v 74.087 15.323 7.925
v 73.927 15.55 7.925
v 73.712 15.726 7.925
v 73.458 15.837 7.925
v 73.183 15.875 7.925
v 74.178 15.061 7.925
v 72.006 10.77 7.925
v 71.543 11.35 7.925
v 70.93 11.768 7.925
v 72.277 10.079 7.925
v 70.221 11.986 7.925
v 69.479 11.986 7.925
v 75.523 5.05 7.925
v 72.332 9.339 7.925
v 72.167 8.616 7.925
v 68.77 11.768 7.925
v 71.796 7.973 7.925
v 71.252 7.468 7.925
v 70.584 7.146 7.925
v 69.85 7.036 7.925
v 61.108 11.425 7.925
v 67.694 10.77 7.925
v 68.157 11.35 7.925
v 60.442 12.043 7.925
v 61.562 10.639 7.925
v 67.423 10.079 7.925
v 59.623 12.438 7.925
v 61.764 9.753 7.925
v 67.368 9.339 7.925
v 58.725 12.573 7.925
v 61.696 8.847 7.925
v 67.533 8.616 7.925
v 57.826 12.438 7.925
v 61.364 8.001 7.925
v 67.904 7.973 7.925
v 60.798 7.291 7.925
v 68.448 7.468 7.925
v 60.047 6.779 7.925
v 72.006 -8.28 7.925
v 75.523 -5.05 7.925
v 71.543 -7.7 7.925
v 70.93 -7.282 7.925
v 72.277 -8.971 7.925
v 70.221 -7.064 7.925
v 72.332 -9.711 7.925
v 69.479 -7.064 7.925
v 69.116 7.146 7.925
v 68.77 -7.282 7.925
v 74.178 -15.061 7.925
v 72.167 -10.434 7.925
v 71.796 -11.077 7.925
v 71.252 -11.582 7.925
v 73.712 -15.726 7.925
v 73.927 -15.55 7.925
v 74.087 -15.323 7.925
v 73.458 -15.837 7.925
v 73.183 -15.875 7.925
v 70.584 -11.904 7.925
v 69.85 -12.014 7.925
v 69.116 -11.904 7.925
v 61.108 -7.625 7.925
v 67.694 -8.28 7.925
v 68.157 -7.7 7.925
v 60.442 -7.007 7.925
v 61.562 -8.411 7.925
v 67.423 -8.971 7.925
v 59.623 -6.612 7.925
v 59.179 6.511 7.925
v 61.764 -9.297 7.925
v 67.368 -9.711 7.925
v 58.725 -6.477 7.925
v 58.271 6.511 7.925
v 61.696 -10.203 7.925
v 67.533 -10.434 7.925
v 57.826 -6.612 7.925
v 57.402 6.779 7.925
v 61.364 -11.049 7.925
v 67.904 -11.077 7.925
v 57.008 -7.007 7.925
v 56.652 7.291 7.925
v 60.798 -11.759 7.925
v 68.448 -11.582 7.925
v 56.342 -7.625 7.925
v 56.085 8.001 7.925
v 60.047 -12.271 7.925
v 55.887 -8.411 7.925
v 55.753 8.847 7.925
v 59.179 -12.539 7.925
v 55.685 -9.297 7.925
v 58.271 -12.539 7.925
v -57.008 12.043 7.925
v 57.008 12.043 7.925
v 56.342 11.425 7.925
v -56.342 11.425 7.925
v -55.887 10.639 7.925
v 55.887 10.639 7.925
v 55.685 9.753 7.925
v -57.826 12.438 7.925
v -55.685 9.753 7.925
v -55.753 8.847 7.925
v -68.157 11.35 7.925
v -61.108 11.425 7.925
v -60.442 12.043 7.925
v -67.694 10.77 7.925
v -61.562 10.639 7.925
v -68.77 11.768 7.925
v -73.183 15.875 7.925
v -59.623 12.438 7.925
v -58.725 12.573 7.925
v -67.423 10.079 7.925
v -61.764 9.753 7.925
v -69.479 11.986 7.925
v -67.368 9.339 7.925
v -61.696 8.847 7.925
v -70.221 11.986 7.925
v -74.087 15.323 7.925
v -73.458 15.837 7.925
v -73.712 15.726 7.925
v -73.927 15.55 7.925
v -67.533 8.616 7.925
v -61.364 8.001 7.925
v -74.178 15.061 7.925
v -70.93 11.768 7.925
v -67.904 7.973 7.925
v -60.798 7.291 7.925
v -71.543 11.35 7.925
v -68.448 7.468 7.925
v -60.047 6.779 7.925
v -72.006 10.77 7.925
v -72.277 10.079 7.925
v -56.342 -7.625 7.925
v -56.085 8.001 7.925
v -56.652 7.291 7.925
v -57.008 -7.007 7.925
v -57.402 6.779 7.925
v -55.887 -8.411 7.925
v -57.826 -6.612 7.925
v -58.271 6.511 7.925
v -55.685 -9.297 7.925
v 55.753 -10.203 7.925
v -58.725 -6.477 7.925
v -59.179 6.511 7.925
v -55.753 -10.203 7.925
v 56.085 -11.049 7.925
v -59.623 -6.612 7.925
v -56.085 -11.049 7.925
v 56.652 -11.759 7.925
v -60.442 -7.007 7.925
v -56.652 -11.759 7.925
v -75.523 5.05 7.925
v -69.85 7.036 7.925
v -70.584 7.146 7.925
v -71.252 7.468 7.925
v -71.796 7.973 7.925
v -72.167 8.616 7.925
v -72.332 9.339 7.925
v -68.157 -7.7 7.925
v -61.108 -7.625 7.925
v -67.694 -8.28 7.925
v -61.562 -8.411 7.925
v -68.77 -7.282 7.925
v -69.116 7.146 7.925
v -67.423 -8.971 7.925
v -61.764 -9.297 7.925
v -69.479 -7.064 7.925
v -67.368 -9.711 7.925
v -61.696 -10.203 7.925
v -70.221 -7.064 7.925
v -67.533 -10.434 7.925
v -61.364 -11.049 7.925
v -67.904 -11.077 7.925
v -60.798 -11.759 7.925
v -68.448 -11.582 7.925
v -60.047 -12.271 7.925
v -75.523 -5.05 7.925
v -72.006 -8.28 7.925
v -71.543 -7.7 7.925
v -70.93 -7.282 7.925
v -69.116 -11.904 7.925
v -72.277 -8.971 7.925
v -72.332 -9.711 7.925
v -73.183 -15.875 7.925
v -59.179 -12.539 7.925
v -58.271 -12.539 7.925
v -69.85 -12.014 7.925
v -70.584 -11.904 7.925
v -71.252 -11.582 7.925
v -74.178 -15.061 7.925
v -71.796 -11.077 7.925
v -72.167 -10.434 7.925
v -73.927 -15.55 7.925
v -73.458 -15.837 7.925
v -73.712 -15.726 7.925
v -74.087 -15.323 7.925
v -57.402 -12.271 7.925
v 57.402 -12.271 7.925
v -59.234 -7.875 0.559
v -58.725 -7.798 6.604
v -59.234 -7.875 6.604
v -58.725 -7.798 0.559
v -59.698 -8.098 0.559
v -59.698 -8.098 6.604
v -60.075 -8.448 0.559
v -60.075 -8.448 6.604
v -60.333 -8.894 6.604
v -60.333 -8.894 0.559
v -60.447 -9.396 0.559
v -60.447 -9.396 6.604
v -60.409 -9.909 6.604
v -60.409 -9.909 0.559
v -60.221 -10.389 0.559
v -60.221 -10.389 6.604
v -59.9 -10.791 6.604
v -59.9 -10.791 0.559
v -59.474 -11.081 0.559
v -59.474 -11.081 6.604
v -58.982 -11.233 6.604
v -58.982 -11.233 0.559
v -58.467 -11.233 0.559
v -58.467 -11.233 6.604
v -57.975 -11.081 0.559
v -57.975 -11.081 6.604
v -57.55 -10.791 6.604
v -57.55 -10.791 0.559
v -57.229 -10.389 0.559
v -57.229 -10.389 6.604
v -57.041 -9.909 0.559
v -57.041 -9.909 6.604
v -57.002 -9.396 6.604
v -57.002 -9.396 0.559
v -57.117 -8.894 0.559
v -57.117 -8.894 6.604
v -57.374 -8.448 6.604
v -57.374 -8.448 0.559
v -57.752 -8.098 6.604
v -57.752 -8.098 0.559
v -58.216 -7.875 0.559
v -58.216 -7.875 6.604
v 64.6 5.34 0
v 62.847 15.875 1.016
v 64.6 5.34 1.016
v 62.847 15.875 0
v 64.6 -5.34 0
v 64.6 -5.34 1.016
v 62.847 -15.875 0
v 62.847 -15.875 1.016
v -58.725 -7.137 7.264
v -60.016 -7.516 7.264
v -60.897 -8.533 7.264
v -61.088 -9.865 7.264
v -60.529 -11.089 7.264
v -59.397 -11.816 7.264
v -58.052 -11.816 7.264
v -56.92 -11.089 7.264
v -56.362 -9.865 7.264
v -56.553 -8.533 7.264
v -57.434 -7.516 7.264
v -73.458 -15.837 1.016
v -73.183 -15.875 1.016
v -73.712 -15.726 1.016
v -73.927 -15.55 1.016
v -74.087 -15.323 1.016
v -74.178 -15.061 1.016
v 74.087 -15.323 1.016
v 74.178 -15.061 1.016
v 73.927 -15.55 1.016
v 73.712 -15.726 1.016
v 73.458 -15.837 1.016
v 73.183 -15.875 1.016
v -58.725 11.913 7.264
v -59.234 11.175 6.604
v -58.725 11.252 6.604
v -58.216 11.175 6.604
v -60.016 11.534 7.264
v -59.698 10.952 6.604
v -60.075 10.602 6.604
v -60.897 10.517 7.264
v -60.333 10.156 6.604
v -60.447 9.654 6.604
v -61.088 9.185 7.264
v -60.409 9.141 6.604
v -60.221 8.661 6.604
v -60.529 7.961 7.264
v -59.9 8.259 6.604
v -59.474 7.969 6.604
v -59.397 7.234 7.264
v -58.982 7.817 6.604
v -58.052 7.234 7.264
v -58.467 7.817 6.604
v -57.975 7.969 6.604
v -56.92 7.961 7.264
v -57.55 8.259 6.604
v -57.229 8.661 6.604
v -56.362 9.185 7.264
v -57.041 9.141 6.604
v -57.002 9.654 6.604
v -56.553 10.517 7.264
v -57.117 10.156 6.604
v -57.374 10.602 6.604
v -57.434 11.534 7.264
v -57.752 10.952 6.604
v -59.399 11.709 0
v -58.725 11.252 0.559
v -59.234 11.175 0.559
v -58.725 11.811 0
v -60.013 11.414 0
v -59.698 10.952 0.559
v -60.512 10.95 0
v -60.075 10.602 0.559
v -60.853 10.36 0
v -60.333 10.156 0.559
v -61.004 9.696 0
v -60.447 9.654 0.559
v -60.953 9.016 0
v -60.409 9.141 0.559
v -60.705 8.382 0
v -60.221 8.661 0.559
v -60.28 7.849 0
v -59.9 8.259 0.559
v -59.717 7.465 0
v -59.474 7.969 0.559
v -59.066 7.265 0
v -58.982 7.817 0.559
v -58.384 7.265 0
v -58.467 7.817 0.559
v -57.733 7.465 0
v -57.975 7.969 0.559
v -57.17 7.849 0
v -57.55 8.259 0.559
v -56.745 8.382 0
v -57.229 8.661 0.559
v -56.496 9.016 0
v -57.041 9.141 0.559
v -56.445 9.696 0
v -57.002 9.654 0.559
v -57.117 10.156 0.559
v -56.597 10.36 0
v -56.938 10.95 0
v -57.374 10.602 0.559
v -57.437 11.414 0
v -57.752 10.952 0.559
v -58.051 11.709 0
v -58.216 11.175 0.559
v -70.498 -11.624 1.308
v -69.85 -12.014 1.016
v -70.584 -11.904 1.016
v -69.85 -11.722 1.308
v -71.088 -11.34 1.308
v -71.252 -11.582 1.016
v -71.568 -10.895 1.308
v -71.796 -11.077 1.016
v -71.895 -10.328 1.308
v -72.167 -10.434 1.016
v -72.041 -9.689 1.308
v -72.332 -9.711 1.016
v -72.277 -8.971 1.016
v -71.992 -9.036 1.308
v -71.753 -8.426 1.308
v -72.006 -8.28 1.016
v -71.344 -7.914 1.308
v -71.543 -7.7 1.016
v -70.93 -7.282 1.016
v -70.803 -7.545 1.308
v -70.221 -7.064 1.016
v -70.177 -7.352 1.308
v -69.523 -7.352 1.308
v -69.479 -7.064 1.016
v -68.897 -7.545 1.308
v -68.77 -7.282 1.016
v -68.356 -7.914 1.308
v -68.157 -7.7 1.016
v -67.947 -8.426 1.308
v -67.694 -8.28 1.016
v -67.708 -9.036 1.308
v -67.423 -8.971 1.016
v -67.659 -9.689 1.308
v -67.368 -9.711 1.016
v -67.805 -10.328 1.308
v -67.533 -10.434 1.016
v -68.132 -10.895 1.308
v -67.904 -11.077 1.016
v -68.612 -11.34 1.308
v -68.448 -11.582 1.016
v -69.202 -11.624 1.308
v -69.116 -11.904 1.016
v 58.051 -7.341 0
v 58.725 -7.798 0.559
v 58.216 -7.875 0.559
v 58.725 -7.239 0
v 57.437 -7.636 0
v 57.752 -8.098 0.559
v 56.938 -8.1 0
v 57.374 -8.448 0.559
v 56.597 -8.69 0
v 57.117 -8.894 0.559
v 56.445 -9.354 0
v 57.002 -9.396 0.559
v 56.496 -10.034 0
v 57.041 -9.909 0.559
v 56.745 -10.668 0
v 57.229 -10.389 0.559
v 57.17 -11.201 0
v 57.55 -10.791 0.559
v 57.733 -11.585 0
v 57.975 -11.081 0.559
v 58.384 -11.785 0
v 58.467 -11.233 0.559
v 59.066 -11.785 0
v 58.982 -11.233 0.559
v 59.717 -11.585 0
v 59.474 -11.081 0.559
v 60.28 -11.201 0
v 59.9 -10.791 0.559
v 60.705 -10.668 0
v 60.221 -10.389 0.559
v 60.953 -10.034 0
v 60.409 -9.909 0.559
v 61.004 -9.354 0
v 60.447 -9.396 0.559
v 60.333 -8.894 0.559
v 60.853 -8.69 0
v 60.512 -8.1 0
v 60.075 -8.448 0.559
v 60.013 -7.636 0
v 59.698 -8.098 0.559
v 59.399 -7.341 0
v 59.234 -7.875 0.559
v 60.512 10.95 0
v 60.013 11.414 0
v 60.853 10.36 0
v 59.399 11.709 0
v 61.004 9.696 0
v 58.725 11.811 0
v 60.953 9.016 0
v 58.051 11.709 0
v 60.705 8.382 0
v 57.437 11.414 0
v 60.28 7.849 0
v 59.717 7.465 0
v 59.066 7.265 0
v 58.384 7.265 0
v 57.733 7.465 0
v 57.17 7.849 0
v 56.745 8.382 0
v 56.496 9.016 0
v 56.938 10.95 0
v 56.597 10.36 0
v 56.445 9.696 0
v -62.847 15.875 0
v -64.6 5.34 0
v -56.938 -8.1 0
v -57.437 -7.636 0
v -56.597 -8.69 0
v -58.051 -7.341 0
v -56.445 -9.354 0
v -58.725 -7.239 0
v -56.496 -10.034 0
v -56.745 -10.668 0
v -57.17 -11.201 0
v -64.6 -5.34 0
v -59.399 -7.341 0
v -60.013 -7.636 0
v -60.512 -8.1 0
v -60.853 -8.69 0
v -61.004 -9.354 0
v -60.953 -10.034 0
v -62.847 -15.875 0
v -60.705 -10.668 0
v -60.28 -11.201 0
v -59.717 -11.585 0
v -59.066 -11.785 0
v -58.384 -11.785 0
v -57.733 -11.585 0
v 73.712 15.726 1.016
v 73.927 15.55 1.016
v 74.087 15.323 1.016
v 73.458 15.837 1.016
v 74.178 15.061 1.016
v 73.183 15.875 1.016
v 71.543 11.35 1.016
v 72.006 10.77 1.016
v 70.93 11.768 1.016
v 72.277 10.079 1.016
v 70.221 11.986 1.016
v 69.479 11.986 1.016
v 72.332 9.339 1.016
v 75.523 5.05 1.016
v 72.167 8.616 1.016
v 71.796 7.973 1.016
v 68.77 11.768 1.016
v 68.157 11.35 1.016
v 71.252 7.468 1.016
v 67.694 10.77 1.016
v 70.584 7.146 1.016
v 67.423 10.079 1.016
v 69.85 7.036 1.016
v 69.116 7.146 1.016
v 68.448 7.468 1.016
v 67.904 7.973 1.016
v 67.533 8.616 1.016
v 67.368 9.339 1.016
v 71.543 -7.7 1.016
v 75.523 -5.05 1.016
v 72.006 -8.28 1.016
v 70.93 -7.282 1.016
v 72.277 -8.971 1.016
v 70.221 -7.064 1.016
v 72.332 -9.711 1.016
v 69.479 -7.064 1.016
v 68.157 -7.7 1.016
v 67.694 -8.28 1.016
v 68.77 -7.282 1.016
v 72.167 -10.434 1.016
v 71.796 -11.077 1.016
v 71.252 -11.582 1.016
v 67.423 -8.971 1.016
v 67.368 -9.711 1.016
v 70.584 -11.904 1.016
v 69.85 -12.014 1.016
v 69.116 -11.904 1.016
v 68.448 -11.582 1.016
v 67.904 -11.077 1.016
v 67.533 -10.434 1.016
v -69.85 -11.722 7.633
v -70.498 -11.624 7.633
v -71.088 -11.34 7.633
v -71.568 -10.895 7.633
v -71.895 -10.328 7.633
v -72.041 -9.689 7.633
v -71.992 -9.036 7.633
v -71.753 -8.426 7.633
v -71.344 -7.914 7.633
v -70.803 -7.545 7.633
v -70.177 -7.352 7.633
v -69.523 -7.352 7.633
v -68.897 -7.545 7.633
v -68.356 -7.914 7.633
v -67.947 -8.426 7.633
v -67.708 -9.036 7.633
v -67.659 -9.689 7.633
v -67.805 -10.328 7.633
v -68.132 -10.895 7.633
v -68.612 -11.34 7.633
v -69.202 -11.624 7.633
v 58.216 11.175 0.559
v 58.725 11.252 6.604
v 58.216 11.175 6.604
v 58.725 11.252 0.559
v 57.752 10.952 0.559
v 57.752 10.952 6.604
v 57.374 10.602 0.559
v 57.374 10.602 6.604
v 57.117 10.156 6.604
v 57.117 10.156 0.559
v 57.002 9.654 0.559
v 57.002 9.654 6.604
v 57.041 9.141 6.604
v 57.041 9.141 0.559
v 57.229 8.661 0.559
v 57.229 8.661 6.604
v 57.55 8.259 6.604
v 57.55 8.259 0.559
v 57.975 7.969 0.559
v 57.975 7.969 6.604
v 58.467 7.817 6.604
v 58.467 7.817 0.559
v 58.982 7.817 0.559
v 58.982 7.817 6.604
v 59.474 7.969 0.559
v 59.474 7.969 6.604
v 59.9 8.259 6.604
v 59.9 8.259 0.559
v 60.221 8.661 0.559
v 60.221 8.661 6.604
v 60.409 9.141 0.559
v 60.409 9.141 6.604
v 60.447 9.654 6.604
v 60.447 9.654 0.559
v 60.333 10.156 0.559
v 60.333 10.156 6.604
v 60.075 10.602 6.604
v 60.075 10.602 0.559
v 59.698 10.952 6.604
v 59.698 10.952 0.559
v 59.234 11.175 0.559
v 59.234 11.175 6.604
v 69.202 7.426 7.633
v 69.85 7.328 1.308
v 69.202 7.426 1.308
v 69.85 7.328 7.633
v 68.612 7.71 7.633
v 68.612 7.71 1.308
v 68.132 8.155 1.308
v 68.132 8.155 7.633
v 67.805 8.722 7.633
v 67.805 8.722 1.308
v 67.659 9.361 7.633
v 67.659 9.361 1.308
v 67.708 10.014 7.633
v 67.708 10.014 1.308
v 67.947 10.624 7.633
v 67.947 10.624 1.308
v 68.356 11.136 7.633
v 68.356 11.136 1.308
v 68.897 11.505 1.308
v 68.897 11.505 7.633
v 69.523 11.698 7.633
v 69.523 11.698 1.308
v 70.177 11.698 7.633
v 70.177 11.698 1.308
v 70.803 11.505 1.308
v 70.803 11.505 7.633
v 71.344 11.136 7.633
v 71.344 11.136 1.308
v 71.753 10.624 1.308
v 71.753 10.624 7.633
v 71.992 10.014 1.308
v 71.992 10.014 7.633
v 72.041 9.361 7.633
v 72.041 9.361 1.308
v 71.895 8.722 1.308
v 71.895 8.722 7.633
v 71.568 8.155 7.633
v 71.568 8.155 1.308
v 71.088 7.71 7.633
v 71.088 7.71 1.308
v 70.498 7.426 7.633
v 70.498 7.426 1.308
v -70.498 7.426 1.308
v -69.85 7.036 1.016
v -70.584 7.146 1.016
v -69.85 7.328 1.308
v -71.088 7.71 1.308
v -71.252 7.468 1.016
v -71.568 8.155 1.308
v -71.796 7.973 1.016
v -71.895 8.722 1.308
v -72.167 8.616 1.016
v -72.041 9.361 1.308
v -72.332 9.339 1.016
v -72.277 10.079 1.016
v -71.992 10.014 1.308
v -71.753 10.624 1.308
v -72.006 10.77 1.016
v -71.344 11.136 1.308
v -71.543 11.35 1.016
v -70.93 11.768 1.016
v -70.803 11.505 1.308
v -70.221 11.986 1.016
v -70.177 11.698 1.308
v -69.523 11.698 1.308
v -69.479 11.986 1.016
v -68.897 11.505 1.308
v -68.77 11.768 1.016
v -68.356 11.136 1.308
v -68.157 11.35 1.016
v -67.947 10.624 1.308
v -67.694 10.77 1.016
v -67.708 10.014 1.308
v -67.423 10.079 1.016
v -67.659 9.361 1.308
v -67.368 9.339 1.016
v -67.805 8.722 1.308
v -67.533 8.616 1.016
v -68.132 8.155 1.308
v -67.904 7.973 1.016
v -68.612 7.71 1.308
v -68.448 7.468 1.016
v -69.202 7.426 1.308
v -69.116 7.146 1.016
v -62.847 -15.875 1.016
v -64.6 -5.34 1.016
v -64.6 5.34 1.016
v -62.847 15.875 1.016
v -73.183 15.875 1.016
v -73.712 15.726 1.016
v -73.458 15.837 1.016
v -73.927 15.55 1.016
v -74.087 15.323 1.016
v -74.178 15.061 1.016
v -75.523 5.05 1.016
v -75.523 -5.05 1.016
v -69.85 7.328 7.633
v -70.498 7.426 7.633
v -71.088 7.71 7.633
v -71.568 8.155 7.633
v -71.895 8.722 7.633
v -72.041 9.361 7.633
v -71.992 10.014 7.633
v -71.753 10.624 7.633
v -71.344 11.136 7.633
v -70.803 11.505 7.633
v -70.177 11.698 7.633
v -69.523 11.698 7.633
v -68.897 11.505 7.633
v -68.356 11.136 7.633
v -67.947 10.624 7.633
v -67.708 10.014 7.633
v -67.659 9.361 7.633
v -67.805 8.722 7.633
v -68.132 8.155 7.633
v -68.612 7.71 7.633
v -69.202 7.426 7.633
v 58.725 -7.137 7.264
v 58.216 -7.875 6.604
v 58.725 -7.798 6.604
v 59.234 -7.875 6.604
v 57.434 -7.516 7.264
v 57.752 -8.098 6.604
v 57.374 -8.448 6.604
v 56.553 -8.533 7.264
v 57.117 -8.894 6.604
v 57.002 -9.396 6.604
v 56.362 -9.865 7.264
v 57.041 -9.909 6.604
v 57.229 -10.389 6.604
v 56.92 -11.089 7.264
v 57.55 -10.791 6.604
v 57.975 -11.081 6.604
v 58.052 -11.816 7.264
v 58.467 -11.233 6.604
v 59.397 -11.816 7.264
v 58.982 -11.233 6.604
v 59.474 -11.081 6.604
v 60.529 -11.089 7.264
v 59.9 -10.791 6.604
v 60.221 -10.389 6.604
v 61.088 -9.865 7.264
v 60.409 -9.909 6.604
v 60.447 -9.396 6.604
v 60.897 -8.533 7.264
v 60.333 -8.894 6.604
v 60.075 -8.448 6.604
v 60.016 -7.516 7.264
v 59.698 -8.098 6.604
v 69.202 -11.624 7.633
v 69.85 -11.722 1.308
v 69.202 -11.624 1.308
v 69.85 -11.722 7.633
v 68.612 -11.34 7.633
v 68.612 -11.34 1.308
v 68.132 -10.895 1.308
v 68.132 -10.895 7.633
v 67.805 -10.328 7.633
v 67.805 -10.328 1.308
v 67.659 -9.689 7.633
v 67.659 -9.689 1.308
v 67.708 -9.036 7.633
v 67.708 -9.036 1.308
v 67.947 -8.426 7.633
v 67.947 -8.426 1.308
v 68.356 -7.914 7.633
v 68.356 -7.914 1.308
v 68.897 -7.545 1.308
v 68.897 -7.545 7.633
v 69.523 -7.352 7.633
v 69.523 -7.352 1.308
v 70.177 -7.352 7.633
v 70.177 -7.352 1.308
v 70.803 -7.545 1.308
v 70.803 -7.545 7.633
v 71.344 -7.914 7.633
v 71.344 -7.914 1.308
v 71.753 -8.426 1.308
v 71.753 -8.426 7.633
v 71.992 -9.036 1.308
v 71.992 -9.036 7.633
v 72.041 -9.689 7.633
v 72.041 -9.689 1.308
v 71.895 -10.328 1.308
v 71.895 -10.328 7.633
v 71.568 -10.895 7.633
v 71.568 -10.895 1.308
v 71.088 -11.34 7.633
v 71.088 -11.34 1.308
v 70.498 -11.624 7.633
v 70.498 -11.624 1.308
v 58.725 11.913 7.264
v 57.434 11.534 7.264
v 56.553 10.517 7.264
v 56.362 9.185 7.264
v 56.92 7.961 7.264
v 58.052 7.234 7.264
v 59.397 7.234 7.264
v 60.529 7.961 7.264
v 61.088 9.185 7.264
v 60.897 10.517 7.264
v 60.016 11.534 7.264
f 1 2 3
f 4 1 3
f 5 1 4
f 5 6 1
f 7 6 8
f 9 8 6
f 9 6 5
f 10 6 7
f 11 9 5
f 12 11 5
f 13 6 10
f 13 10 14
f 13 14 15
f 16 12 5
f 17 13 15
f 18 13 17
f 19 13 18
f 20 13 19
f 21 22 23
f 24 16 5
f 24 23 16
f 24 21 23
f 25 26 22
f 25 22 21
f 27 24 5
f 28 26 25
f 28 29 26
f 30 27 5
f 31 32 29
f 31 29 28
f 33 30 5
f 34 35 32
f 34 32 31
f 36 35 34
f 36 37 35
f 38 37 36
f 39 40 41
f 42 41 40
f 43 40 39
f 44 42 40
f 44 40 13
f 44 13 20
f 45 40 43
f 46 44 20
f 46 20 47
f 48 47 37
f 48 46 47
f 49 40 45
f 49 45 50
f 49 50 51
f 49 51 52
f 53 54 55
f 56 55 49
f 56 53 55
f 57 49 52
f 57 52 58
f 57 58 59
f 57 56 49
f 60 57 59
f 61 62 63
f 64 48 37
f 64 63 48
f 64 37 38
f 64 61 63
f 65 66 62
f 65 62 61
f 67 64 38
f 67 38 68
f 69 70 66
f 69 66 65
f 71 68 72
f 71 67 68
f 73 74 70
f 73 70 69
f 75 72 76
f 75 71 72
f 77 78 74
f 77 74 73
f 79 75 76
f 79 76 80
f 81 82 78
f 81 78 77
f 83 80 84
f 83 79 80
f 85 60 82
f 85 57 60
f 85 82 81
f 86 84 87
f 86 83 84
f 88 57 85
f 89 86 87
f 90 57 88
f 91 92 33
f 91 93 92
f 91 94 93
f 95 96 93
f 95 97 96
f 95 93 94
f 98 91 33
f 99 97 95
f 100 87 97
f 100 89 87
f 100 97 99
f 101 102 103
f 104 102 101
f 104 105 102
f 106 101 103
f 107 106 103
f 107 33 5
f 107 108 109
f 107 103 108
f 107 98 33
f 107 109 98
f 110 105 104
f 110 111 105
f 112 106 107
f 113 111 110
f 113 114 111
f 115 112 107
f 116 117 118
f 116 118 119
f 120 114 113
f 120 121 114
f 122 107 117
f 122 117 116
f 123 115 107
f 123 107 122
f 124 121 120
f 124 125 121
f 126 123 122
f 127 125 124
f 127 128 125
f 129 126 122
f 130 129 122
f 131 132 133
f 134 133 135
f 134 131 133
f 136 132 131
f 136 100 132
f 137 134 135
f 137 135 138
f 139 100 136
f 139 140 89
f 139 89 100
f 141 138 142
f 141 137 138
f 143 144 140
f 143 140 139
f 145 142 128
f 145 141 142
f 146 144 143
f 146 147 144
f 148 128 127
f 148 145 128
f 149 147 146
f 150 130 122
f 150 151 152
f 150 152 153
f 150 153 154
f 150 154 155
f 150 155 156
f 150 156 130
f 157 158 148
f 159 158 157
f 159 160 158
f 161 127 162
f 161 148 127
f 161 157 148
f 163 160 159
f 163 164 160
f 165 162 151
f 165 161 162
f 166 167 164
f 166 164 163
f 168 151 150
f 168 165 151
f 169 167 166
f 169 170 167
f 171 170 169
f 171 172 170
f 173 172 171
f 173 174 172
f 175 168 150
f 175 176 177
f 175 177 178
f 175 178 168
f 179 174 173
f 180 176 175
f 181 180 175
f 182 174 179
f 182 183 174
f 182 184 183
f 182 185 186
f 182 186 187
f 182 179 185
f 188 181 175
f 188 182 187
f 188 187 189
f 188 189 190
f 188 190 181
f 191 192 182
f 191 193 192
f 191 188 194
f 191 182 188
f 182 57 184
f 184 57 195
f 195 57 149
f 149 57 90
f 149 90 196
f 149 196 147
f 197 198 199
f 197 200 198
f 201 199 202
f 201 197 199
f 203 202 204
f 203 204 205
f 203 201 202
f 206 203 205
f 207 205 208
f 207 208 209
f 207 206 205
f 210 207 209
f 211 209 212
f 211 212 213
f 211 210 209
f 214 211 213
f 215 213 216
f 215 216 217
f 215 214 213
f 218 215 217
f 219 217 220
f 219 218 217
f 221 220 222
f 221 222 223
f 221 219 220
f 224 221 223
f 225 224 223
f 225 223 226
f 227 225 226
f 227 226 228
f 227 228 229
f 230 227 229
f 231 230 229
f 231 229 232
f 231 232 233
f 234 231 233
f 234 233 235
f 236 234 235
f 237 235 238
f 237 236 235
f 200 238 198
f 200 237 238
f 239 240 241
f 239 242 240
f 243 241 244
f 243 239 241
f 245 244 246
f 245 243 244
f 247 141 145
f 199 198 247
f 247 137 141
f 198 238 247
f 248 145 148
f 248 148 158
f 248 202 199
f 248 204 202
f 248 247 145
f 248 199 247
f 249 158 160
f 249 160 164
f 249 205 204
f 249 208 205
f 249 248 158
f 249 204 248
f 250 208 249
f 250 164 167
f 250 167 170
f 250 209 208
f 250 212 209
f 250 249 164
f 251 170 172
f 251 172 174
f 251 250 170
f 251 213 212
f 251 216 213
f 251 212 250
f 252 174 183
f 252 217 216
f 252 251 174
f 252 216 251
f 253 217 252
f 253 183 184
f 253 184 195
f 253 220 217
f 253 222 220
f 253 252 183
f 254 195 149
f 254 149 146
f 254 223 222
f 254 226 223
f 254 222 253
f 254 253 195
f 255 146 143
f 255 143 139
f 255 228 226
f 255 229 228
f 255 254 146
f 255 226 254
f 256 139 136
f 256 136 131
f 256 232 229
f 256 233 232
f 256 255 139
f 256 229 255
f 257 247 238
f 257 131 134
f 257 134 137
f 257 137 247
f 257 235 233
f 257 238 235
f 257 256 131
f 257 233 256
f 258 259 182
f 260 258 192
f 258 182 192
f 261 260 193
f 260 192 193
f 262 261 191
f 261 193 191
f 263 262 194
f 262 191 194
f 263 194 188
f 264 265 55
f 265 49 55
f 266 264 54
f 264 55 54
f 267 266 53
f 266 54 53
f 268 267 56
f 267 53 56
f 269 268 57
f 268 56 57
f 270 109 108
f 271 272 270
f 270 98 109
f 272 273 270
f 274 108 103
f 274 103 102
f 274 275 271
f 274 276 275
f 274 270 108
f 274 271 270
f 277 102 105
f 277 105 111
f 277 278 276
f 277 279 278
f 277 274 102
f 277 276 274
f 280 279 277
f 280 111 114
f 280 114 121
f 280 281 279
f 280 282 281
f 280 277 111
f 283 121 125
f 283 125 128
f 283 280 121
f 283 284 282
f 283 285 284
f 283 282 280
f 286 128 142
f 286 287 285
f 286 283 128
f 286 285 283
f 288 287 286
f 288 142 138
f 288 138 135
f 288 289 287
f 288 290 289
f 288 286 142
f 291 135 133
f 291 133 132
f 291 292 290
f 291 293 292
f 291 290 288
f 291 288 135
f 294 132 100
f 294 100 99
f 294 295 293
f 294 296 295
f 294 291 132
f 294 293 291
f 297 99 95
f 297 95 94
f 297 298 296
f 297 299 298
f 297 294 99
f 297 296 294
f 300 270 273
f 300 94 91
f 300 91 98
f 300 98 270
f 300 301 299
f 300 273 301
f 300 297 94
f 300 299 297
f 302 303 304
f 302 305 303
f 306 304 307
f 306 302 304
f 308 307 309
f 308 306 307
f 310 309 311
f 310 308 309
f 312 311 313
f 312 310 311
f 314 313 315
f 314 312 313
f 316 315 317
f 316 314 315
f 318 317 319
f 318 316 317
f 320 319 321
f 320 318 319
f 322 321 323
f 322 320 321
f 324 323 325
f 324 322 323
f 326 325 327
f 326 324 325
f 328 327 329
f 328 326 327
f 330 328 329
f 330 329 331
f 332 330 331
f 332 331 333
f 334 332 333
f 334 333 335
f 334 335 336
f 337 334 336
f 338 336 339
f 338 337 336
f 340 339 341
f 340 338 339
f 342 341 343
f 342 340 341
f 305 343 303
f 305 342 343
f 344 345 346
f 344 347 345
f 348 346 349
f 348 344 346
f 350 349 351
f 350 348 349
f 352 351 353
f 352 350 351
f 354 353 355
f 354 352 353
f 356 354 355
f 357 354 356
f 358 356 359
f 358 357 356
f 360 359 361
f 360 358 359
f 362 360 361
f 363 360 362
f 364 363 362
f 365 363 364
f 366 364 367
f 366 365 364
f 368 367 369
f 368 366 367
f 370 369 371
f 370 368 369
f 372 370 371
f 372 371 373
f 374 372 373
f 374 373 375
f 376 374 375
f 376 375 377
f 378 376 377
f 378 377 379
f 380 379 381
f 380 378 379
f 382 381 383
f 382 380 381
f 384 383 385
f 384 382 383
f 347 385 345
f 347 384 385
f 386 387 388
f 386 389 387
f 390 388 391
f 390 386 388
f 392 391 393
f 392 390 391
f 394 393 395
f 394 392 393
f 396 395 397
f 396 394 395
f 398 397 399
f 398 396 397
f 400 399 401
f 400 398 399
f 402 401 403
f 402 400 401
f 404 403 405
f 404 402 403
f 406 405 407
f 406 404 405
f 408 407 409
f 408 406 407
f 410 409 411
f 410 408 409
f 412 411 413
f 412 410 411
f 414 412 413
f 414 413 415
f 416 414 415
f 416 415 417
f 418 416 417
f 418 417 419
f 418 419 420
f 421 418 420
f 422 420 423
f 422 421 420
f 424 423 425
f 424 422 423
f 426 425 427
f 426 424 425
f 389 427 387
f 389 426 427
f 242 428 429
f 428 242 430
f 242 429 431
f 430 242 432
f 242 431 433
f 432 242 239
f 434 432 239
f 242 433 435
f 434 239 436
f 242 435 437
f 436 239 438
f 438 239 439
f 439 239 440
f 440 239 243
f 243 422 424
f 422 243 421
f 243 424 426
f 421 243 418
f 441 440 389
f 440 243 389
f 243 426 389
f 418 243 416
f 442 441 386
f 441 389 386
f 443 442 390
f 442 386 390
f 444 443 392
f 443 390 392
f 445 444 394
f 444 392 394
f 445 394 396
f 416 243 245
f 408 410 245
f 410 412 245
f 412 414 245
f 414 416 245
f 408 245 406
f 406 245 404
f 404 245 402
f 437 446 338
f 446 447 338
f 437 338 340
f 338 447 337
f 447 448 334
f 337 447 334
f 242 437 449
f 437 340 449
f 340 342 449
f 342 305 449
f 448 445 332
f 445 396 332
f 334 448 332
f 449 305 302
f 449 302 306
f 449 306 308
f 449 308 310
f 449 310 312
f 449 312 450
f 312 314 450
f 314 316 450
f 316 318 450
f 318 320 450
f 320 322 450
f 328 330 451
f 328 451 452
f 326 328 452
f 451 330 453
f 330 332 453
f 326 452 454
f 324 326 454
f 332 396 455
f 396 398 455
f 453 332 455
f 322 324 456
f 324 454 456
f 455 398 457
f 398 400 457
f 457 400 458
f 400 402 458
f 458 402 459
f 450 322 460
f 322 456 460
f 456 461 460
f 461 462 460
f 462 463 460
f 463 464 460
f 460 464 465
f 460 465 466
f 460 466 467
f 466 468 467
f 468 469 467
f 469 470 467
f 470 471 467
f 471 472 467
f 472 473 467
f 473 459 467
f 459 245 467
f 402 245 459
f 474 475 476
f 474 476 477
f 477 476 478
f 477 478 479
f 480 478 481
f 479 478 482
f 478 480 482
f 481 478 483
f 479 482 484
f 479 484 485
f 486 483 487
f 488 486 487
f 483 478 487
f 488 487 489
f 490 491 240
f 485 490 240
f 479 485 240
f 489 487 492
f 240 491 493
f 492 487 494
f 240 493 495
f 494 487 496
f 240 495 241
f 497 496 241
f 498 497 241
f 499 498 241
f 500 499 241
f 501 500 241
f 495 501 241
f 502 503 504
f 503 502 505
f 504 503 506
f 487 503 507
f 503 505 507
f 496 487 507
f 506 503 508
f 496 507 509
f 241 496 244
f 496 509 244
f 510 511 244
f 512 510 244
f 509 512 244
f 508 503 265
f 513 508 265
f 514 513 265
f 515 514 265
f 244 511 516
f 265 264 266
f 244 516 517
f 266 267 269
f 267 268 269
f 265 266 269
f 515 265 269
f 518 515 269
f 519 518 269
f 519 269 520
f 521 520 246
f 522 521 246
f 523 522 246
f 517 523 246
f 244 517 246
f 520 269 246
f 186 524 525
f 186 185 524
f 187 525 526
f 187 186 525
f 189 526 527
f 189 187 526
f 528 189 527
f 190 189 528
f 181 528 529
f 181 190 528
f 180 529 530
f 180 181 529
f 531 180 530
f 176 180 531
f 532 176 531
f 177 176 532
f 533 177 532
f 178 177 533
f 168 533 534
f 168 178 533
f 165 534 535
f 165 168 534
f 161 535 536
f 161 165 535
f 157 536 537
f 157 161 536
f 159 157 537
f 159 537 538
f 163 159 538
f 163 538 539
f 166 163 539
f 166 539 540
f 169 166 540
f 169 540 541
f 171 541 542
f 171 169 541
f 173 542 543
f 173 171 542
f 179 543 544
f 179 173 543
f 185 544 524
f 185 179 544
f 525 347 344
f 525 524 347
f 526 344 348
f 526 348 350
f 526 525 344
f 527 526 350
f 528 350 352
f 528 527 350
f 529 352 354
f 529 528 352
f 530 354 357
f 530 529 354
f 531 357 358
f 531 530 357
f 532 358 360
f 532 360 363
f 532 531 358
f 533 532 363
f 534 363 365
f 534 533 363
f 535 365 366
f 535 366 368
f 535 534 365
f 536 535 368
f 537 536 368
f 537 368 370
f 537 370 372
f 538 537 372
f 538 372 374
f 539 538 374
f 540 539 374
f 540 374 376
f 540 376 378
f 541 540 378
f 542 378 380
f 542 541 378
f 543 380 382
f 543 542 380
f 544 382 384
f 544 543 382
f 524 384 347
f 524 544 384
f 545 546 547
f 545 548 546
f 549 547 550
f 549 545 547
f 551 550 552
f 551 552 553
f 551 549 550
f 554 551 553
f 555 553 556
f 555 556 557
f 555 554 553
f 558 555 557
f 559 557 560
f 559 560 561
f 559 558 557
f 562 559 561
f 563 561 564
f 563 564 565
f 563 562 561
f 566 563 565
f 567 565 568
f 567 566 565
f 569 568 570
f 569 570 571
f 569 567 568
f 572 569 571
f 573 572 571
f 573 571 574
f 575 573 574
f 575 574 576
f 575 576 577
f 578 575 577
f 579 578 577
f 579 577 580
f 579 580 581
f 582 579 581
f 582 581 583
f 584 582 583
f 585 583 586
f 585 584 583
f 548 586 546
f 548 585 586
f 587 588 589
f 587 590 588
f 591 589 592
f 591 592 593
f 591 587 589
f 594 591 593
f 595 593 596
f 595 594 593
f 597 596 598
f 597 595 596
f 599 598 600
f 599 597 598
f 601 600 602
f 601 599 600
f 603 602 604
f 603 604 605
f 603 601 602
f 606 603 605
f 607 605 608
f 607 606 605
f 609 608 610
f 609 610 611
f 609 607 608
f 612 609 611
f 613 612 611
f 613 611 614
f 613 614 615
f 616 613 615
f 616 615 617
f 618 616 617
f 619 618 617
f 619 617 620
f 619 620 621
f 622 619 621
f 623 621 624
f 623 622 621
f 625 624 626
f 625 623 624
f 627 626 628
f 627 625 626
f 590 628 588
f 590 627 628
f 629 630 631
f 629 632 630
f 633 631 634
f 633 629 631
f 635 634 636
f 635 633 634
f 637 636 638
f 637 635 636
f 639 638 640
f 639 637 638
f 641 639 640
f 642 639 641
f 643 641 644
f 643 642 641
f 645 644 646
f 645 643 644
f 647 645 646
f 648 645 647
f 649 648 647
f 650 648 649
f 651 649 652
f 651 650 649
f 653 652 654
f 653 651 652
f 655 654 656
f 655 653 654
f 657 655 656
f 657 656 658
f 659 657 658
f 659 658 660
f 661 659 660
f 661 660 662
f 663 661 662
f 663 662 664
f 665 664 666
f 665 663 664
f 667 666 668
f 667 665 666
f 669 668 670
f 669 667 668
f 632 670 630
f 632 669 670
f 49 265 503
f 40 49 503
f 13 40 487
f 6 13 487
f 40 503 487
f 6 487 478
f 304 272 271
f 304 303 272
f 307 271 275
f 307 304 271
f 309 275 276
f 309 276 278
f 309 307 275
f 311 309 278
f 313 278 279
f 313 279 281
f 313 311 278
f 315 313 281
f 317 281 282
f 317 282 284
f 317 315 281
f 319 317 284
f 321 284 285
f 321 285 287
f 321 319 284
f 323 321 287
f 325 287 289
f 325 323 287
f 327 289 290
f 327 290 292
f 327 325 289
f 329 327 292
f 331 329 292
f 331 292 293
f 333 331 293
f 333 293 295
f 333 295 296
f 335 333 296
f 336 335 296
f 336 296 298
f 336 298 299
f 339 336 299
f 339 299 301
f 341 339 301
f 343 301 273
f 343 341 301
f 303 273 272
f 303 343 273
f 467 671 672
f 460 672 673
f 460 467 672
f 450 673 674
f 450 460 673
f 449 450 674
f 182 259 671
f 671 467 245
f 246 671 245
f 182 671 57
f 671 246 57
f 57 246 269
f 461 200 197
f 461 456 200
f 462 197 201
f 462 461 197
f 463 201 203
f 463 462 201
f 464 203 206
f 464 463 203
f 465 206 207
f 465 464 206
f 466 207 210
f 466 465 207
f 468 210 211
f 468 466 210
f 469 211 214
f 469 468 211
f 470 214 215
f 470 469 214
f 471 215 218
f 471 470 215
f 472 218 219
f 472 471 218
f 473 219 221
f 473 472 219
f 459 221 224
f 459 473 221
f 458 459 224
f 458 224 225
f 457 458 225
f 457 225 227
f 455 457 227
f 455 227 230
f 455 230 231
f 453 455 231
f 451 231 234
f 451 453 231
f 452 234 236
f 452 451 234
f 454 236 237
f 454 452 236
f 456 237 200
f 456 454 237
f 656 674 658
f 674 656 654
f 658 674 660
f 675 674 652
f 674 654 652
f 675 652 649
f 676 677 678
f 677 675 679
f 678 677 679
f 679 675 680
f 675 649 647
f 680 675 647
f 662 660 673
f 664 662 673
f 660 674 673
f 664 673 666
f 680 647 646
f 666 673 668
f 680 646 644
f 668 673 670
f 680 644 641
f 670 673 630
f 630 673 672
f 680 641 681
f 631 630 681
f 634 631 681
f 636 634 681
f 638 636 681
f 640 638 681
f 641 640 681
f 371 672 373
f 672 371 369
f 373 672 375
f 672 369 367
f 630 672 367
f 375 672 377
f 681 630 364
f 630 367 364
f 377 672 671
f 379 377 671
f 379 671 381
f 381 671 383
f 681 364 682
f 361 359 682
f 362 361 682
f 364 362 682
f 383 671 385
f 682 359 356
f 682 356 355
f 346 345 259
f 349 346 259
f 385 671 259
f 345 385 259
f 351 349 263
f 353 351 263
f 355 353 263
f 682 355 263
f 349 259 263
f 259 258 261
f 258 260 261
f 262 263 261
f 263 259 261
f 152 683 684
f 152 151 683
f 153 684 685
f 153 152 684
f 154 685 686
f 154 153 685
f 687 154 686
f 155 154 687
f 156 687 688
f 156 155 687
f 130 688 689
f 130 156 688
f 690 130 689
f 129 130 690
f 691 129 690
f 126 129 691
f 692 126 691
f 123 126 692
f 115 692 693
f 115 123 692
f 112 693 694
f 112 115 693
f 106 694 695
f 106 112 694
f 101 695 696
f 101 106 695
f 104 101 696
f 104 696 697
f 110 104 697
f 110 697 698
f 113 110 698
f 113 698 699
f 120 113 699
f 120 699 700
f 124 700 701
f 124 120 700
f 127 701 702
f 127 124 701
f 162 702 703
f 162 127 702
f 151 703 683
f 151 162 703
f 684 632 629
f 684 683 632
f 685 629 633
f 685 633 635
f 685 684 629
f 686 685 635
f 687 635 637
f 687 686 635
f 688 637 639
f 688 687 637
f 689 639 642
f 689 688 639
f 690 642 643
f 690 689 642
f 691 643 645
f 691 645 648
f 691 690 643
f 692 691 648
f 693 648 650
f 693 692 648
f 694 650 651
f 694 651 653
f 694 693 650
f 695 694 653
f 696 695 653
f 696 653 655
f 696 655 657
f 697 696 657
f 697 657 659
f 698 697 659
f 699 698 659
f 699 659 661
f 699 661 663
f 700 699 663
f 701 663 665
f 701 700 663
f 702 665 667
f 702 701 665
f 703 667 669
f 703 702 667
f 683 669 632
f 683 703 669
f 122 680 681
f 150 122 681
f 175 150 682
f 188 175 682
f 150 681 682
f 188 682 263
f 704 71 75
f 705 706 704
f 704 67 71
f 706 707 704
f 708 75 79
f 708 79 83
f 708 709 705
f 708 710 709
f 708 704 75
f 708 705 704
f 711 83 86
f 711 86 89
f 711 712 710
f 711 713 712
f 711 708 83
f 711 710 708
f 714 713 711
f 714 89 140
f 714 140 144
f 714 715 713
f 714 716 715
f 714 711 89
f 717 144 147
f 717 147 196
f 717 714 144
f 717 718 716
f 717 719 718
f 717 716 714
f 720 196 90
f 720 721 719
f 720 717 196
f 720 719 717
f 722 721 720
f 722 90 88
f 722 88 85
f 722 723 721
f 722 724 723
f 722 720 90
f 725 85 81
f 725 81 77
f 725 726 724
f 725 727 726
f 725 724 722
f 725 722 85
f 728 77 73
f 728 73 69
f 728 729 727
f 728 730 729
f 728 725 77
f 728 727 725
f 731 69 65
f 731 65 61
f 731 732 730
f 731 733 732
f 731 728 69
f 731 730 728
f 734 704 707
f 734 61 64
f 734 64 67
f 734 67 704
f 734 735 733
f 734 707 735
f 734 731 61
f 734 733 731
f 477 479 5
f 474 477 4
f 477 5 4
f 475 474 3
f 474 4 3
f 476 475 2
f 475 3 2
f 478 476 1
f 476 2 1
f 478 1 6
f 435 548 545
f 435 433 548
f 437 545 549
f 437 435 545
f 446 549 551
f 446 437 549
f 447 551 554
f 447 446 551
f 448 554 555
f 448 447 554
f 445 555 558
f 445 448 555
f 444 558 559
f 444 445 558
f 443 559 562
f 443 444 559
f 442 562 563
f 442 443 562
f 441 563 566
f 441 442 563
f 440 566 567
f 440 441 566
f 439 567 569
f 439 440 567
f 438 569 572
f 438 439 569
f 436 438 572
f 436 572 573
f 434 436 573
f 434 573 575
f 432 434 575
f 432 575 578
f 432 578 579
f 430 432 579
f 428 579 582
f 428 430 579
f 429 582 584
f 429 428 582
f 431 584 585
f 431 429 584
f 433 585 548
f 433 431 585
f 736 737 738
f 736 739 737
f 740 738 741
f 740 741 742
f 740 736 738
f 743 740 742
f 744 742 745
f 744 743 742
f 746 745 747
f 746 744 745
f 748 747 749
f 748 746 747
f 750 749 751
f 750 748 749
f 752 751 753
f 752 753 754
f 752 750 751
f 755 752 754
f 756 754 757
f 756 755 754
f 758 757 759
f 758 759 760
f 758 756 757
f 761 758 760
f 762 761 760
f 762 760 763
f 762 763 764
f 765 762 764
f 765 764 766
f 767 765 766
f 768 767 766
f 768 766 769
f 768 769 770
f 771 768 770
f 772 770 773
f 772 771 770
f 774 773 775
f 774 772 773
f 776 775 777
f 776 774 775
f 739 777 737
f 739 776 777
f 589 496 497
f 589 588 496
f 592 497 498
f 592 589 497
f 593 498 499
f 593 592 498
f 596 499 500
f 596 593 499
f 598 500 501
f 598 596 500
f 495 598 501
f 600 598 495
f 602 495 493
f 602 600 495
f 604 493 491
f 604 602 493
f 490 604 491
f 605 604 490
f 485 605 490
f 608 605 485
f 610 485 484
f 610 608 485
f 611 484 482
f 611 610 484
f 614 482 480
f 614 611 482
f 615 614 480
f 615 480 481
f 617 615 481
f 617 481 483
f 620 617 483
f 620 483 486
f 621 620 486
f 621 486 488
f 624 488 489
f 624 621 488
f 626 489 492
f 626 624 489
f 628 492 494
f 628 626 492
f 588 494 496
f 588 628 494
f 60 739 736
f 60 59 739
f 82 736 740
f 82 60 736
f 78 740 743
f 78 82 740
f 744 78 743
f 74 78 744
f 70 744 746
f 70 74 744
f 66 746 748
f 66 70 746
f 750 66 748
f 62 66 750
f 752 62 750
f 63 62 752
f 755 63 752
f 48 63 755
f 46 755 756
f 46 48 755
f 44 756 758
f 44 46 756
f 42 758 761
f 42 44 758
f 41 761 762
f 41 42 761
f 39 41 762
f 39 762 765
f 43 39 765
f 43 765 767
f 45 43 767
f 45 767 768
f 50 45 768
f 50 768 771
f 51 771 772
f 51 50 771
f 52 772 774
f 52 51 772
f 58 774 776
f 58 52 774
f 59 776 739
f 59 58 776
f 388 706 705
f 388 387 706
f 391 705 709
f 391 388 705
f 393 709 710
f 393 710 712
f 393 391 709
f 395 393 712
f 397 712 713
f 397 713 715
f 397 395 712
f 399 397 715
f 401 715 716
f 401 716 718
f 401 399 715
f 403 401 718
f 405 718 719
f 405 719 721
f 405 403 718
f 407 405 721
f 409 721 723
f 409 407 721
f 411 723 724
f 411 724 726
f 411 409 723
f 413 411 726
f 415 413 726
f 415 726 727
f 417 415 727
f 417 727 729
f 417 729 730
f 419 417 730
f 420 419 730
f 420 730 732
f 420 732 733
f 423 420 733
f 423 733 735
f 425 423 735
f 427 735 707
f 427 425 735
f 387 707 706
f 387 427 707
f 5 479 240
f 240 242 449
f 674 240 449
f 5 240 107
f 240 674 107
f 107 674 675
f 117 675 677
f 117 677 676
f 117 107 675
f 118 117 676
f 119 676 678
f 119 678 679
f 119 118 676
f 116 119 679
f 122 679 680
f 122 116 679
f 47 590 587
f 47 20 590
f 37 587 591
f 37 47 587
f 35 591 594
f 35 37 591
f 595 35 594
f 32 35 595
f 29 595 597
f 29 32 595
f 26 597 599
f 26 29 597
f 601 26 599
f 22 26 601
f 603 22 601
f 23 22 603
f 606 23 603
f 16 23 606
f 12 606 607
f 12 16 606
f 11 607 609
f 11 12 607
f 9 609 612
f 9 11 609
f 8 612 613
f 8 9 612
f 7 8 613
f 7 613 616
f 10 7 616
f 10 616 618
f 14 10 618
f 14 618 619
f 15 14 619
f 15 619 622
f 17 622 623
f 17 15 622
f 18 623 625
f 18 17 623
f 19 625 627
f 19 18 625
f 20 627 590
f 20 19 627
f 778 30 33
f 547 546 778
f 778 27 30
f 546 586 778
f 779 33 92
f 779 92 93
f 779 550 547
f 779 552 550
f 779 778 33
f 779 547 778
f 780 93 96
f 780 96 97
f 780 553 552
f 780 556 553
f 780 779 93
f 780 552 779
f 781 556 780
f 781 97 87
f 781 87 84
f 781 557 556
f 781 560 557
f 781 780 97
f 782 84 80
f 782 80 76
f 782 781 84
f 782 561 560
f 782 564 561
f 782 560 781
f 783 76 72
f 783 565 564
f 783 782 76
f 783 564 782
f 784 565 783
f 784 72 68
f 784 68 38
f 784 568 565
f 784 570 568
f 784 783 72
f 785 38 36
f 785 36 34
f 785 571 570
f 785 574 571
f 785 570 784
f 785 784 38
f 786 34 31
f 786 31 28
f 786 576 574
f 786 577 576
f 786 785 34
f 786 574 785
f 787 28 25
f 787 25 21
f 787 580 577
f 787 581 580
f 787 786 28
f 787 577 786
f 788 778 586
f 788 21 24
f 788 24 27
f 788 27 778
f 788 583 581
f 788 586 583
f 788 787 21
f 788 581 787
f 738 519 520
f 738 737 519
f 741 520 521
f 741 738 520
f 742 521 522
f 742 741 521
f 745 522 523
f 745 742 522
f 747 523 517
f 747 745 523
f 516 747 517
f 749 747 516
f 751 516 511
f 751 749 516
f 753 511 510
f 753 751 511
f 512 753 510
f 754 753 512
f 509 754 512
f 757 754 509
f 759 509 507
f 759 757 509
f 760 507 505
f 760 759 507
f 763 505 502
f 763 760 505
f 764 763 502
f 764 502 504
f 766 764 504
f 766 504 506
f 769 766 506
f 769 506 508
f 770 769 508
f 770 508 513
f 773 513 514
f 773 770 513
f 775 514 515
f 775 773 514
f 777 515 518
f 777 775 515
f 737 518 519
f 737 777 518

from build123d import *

# Parameters (mm, degrees)
BOSS_EXTRUDE1_DEPTH                  = 7.9248
SKETCH12_W                           = 35.56
SKETCH12_H                           = 35.56
FILLET1_R                            = 1.016
F_8_32_TAPPED_HOLE2_AT_2_COUNT       = 2
F_8_32_TAPPED_HOLE2_AT_2_PITCH       = 19.05
F_8_32_TAPPED_HOLE2_AT_3_COUNT       = 2
F_8_32_TAPPED_HOLE2_AT_3_PITCH       = 117.4496
F_8_32_TAPPED_HOLE2_AT_4_COUNT       = 2
F_8_32_TAPPED_HOLE2_AT_4_PITCH       = 118.984499159
F_17_0_173_DIAMETER_HOLE1_AT_2_COUNT = 2
F_17_0_173_DIAMETER_HOLE1_AT_2_PITCH = 19.05
F_17_0_173_DIAMETER_HOLE1_AT_3_COUNT = 2
F_17_0_173_DIAMETER_HOLE1_AT_3_PITCH = 139.7
F_17_0_173_DIAMETER_HOLE1_AT_4_COUNT = 2
F_17_0_173_DIAMETER_HOLE1_AT_4_PITCH = 140.992881026


with BuildPart() as part:
    # Sketch1 → Boss-Extrude1 (new body)
    with BuildSketch(Plane(origin=(0, 0, 0), x_dir=(1, 0, 0), z_dir=(0, 0, -1))):
        with BuildLine():
            Line((74.008534906, -15.875), (-74.008534906, -15.875))
            ThreePointArc((-74.008534906, -15.875), (-75.692, 0), (-74.008534906, 15.875))
            Line((-74.008534906, 15.875), (74.008534906, 15.875))
            ThreePointArc((74.008534906, 15.875), (75.692, 0), (74.008534906, -15.875))
        make_face()
    extrude(amount=-BOSS_EXTRUDE1_DEPTH)

    # Sketch12 → Cut-Revolve1 (revolve, cut)
    with BuildSketch(Plane(origin=(0, 0, 0), x_dir=(1, 0, 0), z_dir=(0, 1, 0))):
        with Locations((82.6008, 16.764)):
            Rectangle(SKETCH12_W, SKETCH12_H)
    revolve(axis=Axis((0, 0, -12.484857721), (0, 0, -1)), mode=Mode.SUBTRACT)

    # Fillet1
    fillet1_edges = [part.edges().sort_by_distance(p)[0] for p in [
        (74.008534906, 15.875, 4.4704),
        (-74.008534906, 15.875, 4.4704),
        (-74.008534906, -15.875, 4.4704),
        (74.008534906, -15.875, 4.4704),
    ]]
    fillet(fillet1_edges, radius=FILLET1_R)

    # Sketch2 → #8-32 Tapped Hole2 (revolve, cut)
    with BuildSketch(Plane(origin=(-58.7248, 9.525, 0), x_dir=(0, 1, 0), z_dir=(1, 0, 0))):
        Polygon((0, 0), (0, 7.9248), (3.048, 7.9248), (1.7272, 6.604), (1.7272, 0.5588), (2.286, 0), align=None)
    f_8_32_tapped_hole2 = revolve(axis=Axis((-58.7248, 9.525, -6.35), (0, 0, 1)), mode=Mode.SUBTRACT)

    # #8-32 Tapped Hole2 at 2: #8-32 Tapped Hole2 ×2
    with Locations(*[(0, -i * F_8_32_TAPPED_HOLE2_AT_2_PITCH, 0) for i in range(1, F_8_32_TAPPED_HOLE2_AT_2_COUNT)]):
        add(f_8_32_tapped_hole2, mode=Mode.SUBTRACT)

    # #8-32 Tapped Hole2 at 3: #8-32 Tapped Hole2 ×2
    with Locations(*[(i * F_8_32_TAPPED_HOLE2_AT_3_PITCH, 0, 0) for i in range(1, F_8_32_TAPPED_HOLE2_AT_3_COUNT)]):
        add(f_8_32_tapped_hole2, mode=Mode.SUBTRACT)

    # #8-32 Tapped Hole2 at 4: #8-32 Tapped Hole2 ×2
    with Locations(*[Vector(0.9871000073957296, -0.16010488874281947, 0) * (i * F_8_32_TAPPED_HOLE2_AT_4_PITCH) for i in range(1, F_8_32_TAPPED_HOLE2_AT_4_COUNT)]):
        add(f_8_32_tapped_hole2, mode=Mode.SUBTRACT)

    # Sketch5 → #17 (0.173) Diameter Hole1 (revolve, cut)
    with BuildSketch(Plane(origin=(69.85, 9.525, 7.9248), x_dir=(0, -1, 0), z_dir=(1, 0, 0))):
        Polygon((0, 0), (0, 6.9088), (2.4892, 6.9088), (2.1971, 6.6167), (2.1971, 0.2921), (2.4892, 0), align=None)
    f_17_0_173_diameter_hole1 = revolve(axis=Axis((69.85, 9.525, 14.2748), (0, 0, -1)), mode=Mode.SUBTRACT)

    # #17 (0.173) Diameter Hole1 at 2: #17 (0.173) Diameter Hole1 ×2
    with Locations(*[(0, -i * F_17_0_173_DIAMETER_HOLE1_AT_2_PITCH, 0) for i in range(1, F_17_0_173_DIAMETER_HOLE1_AT_2_COUNT)]):
        add(f_17_0_173_diameter_hole1, mode=Mode.SUBTRACT)

    # #17 (0.173) Diameter Hole1 at 3: #17 (0.173) Diameter Hole1 ×2
    with Locations(*[(-i * F_17_0_173_DIAMETER_HOLE1_AT_3_PITCH, 0, 0) for i in range(1, F_17_0_173_DIAMETER_HOLE1_AT_3_COUNT)]):
        add(f_17_0_173_diameter_hole1, mode=Mode.SUBTRACT)

    # #17 (0.173) Diameter Hole1 at 4: #17 (0.173) Diameter Hole1 ×2
    with Locations(*[Vector(-0.990830168044299, -0.13511320473331354, 0) * (i * F_17_0_173_DIAMETER_HOLE1_AT_4_PITCH) for i in range(1, F_17_0_173_DIAMETER_HOLE1_AT_4_COUNT)]):
        add(f_17_0_173_diameter_hole1, mode=Mode.SUBTRACT)


solid = part.part
